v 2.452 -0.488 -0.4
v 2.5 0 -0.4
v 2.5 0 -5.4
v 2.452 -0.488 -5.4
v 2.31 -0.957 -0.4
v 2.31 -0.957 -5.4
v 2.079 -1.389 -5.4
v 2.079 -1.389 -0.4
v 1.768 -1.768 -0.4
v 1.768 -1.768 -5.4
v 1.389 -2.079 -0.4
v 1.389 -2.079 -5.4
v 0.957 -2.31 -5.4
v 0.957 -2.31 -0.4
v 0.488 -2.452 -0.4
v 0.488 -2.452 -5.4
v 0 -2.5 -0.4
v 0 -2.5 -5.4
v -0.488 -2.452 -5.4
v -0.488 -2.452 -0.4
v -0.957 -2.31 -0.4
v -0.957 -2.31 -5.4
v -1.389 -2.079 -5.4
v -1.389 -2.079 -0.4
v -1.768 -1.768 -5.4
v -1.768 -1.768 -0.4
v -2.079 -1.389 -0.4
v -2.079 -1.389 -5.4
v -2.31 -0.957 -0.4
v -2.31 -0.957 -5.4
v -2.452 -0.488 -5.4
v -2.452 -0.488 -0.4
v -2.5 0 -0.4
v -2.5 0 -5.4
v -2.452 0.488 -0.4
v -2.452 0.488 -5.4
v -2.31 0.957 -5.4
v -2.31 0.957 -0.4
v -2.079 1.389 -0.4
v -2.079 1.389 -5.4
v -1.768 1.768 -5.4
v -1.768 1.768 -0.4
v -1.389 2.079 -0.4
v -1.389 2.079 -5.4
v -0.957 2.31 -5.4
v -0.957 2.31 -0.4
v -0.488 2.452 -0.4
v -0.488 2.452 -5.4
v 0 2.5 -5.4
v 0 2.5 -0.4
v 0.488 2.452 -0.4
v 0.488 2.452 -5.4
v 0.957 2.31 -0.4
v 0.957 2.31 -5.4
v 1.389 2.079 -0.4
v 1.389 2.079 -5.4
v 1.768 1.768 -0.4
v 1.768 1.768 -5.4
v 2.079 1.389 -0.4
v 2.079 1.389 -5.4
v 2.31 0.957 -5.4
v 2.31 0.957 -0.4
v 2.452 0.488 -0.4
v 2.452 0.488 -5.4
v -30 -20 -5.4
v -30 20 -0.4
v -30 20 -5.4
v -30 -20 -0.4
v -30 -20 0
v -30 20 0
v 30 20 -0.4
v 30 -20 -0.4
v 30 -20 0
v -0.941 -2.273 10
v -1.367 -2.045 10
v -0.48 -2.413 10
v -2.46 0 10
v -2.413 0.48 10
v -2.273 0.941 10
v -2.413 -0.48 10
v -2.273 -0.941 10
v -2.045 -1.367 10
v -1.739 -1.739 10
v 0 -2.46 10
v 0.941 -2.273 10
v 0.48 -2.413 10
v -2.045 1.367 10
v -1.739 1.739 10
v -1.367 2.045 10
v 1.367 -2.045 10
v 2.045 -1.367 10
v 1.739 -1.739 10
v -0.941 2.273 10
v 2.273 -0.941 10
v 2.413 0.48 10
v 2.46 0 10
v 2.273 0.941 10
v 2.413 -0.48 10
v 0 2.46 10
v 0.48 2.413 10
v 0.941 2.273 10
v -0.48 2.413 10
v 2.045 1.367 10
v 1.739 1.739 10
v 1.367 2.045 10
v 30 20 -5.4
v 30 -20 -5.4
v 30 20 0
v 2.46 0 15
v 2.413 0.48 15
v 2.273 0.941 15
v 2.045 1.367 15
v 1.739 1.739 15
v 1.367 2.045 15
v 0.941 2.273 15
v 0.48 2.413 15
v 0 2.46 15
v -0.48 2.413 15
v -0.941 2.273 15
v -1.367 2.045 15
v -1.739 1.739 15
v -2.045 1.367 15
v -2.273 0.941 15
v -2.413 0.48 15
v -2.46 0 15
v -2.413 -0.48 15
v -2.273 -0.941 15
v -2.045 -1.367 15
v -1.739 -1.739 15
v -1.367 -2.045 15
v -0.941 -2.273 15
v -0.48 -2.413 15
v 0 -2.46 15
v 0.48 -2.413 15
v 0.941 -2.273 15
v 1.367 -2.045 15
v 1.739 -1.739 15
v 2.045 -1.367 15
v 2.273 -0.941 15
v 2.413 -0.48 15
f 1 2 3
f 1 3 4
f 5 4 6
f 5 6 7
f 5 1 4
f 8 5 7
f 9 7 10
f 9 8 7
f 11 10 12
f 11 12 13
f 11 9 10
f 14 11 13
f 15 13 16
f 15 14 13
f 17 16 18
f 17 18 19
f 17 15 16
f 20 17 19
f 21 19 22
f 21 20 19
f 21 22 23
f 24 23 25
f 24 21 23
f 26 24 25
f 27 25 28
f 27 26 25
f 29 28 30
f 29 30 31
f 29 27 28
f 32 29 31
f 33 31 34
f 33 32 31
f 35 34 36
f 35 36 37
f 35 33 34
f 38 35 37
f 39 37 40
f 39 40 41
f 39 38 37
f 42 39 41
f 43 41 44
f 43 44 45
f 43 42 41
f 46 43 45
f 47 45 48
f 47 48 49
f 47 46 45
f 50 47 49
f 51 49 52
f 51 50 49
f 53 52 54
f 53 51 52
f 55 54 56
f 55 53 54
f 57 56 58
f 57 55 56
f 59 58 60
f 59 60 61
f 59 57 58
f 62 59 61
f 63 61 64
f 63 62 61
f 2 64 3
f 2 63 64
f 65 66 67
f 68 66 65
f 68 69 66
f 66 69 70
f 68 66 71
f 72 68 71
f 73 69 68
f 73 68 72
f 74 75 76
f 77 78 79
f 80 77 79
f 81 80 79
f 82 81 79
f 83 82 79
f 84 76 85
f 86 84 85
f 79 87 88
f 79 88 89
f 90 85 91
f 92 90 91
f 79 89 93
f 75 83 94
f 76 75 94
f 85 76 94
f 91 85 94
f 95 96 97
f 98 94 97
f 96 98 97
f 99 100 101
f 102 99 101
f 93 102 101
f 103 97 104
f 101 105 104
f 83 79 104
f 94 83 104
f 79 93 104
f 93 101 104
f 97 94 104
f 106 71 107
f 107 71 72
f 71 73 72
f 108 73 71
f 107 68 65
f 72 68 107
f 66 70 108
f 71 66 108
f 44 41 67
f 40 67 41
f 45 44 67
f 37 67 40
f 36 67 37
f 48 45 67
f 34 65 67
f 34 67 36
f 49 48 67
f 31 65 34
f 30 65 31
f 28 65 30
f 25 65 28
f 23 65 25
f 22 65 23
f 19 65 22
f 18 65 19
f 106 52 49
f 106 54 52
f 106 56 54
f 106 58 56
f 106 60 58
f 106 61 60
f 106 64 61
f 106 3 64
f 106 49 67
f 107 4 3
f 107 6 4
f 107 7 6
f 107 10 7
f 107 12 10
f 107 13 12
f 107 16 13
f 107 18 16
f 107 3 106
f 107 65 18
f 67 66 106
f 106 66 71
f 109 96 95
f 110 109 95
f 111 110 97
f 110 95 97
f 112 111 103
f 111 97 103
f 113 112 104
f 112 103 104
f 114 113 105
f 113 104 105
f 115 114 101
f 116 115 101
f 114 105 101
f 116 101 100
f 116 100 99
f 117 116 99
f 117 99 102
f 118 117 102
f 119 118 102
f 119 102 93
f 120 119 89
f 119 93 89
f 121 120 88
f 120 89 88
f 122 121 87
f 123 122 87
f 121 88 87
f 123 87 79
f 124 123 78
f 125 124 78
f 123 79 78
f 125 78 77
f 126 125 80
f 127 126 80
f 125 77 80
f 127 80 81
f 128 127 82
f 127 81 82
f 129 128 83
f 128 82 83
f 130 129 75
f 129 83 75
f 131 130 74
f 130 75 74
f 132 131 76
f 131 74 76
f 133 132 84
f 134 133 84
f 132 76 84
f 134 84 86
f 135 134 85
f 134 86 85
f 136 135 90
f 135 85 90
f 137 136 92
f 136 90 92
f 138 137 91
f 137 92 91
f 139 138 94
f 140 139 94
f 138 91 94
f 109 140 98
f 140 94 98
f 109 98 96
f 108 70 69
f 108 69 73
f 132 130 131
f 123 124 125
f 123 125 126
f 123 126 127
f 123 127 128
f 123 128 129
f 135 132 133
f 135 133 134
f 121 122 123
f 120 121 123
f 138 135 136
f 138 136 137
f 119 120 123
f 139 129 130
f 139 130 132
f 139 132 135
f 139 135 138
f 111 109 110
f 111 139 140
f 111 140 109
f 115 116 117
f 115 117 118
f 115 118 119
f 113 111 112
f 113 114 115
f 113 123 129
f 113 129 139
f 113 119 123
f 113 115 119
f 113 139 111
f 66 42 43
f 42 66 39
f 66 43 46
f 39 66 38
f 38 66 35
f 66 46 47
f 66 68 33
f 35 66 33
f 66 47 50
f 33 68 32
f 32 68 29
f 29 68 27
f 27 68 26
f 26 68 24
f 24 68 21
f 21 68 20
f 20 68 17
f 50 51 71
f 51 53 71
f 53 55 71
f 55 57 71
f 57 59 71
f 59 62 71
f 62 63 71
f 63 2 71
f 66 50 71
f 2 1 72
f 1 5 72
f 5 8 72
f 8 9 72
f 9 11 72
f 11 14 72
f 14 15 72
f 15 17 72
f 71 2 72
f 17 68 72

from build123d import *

# Parameters (mm, degrees)
F0_W     = 60
F0_H     = 40
F1_DEPTH = 0.4
F3_R     = 2.46
F4_DEPTH = 5
F5_W     = 60
F5_H     = 40
F5_R     = 2.5
F6_DEPTH = 5


with BuildPart() as f1:
    # F0 (on Top) → F1 (new body)
    with BuildSketch(Plane.XY):
        Rectangle(F0_W, F0_H)
    extrude(amount=-F1_DEPTH)


with BuildPart() as f4:
    # F3 (on offset) → F4 (new body)
    with BuildSketch(Plane.XY.offset(10)):
        Circle(F3_R)
    extrude(amount=F4_DEPTH)


with BuildPart() as f6:
    # F5 (on face) → F6 (new body)
    with BuildSketch(Plane(origin=(0, 0, -0.4), x_dir=(1, 0, 0), z_dir=(0, 0, -1))):
        Rectangle(F5_W, F5_H)
        Circle(F5_R, mode=Mode.SUBTRACT)
    extrude(amount=F6_DEPTH)


solid = Compound([f1.part, f4.part, f6.part])
